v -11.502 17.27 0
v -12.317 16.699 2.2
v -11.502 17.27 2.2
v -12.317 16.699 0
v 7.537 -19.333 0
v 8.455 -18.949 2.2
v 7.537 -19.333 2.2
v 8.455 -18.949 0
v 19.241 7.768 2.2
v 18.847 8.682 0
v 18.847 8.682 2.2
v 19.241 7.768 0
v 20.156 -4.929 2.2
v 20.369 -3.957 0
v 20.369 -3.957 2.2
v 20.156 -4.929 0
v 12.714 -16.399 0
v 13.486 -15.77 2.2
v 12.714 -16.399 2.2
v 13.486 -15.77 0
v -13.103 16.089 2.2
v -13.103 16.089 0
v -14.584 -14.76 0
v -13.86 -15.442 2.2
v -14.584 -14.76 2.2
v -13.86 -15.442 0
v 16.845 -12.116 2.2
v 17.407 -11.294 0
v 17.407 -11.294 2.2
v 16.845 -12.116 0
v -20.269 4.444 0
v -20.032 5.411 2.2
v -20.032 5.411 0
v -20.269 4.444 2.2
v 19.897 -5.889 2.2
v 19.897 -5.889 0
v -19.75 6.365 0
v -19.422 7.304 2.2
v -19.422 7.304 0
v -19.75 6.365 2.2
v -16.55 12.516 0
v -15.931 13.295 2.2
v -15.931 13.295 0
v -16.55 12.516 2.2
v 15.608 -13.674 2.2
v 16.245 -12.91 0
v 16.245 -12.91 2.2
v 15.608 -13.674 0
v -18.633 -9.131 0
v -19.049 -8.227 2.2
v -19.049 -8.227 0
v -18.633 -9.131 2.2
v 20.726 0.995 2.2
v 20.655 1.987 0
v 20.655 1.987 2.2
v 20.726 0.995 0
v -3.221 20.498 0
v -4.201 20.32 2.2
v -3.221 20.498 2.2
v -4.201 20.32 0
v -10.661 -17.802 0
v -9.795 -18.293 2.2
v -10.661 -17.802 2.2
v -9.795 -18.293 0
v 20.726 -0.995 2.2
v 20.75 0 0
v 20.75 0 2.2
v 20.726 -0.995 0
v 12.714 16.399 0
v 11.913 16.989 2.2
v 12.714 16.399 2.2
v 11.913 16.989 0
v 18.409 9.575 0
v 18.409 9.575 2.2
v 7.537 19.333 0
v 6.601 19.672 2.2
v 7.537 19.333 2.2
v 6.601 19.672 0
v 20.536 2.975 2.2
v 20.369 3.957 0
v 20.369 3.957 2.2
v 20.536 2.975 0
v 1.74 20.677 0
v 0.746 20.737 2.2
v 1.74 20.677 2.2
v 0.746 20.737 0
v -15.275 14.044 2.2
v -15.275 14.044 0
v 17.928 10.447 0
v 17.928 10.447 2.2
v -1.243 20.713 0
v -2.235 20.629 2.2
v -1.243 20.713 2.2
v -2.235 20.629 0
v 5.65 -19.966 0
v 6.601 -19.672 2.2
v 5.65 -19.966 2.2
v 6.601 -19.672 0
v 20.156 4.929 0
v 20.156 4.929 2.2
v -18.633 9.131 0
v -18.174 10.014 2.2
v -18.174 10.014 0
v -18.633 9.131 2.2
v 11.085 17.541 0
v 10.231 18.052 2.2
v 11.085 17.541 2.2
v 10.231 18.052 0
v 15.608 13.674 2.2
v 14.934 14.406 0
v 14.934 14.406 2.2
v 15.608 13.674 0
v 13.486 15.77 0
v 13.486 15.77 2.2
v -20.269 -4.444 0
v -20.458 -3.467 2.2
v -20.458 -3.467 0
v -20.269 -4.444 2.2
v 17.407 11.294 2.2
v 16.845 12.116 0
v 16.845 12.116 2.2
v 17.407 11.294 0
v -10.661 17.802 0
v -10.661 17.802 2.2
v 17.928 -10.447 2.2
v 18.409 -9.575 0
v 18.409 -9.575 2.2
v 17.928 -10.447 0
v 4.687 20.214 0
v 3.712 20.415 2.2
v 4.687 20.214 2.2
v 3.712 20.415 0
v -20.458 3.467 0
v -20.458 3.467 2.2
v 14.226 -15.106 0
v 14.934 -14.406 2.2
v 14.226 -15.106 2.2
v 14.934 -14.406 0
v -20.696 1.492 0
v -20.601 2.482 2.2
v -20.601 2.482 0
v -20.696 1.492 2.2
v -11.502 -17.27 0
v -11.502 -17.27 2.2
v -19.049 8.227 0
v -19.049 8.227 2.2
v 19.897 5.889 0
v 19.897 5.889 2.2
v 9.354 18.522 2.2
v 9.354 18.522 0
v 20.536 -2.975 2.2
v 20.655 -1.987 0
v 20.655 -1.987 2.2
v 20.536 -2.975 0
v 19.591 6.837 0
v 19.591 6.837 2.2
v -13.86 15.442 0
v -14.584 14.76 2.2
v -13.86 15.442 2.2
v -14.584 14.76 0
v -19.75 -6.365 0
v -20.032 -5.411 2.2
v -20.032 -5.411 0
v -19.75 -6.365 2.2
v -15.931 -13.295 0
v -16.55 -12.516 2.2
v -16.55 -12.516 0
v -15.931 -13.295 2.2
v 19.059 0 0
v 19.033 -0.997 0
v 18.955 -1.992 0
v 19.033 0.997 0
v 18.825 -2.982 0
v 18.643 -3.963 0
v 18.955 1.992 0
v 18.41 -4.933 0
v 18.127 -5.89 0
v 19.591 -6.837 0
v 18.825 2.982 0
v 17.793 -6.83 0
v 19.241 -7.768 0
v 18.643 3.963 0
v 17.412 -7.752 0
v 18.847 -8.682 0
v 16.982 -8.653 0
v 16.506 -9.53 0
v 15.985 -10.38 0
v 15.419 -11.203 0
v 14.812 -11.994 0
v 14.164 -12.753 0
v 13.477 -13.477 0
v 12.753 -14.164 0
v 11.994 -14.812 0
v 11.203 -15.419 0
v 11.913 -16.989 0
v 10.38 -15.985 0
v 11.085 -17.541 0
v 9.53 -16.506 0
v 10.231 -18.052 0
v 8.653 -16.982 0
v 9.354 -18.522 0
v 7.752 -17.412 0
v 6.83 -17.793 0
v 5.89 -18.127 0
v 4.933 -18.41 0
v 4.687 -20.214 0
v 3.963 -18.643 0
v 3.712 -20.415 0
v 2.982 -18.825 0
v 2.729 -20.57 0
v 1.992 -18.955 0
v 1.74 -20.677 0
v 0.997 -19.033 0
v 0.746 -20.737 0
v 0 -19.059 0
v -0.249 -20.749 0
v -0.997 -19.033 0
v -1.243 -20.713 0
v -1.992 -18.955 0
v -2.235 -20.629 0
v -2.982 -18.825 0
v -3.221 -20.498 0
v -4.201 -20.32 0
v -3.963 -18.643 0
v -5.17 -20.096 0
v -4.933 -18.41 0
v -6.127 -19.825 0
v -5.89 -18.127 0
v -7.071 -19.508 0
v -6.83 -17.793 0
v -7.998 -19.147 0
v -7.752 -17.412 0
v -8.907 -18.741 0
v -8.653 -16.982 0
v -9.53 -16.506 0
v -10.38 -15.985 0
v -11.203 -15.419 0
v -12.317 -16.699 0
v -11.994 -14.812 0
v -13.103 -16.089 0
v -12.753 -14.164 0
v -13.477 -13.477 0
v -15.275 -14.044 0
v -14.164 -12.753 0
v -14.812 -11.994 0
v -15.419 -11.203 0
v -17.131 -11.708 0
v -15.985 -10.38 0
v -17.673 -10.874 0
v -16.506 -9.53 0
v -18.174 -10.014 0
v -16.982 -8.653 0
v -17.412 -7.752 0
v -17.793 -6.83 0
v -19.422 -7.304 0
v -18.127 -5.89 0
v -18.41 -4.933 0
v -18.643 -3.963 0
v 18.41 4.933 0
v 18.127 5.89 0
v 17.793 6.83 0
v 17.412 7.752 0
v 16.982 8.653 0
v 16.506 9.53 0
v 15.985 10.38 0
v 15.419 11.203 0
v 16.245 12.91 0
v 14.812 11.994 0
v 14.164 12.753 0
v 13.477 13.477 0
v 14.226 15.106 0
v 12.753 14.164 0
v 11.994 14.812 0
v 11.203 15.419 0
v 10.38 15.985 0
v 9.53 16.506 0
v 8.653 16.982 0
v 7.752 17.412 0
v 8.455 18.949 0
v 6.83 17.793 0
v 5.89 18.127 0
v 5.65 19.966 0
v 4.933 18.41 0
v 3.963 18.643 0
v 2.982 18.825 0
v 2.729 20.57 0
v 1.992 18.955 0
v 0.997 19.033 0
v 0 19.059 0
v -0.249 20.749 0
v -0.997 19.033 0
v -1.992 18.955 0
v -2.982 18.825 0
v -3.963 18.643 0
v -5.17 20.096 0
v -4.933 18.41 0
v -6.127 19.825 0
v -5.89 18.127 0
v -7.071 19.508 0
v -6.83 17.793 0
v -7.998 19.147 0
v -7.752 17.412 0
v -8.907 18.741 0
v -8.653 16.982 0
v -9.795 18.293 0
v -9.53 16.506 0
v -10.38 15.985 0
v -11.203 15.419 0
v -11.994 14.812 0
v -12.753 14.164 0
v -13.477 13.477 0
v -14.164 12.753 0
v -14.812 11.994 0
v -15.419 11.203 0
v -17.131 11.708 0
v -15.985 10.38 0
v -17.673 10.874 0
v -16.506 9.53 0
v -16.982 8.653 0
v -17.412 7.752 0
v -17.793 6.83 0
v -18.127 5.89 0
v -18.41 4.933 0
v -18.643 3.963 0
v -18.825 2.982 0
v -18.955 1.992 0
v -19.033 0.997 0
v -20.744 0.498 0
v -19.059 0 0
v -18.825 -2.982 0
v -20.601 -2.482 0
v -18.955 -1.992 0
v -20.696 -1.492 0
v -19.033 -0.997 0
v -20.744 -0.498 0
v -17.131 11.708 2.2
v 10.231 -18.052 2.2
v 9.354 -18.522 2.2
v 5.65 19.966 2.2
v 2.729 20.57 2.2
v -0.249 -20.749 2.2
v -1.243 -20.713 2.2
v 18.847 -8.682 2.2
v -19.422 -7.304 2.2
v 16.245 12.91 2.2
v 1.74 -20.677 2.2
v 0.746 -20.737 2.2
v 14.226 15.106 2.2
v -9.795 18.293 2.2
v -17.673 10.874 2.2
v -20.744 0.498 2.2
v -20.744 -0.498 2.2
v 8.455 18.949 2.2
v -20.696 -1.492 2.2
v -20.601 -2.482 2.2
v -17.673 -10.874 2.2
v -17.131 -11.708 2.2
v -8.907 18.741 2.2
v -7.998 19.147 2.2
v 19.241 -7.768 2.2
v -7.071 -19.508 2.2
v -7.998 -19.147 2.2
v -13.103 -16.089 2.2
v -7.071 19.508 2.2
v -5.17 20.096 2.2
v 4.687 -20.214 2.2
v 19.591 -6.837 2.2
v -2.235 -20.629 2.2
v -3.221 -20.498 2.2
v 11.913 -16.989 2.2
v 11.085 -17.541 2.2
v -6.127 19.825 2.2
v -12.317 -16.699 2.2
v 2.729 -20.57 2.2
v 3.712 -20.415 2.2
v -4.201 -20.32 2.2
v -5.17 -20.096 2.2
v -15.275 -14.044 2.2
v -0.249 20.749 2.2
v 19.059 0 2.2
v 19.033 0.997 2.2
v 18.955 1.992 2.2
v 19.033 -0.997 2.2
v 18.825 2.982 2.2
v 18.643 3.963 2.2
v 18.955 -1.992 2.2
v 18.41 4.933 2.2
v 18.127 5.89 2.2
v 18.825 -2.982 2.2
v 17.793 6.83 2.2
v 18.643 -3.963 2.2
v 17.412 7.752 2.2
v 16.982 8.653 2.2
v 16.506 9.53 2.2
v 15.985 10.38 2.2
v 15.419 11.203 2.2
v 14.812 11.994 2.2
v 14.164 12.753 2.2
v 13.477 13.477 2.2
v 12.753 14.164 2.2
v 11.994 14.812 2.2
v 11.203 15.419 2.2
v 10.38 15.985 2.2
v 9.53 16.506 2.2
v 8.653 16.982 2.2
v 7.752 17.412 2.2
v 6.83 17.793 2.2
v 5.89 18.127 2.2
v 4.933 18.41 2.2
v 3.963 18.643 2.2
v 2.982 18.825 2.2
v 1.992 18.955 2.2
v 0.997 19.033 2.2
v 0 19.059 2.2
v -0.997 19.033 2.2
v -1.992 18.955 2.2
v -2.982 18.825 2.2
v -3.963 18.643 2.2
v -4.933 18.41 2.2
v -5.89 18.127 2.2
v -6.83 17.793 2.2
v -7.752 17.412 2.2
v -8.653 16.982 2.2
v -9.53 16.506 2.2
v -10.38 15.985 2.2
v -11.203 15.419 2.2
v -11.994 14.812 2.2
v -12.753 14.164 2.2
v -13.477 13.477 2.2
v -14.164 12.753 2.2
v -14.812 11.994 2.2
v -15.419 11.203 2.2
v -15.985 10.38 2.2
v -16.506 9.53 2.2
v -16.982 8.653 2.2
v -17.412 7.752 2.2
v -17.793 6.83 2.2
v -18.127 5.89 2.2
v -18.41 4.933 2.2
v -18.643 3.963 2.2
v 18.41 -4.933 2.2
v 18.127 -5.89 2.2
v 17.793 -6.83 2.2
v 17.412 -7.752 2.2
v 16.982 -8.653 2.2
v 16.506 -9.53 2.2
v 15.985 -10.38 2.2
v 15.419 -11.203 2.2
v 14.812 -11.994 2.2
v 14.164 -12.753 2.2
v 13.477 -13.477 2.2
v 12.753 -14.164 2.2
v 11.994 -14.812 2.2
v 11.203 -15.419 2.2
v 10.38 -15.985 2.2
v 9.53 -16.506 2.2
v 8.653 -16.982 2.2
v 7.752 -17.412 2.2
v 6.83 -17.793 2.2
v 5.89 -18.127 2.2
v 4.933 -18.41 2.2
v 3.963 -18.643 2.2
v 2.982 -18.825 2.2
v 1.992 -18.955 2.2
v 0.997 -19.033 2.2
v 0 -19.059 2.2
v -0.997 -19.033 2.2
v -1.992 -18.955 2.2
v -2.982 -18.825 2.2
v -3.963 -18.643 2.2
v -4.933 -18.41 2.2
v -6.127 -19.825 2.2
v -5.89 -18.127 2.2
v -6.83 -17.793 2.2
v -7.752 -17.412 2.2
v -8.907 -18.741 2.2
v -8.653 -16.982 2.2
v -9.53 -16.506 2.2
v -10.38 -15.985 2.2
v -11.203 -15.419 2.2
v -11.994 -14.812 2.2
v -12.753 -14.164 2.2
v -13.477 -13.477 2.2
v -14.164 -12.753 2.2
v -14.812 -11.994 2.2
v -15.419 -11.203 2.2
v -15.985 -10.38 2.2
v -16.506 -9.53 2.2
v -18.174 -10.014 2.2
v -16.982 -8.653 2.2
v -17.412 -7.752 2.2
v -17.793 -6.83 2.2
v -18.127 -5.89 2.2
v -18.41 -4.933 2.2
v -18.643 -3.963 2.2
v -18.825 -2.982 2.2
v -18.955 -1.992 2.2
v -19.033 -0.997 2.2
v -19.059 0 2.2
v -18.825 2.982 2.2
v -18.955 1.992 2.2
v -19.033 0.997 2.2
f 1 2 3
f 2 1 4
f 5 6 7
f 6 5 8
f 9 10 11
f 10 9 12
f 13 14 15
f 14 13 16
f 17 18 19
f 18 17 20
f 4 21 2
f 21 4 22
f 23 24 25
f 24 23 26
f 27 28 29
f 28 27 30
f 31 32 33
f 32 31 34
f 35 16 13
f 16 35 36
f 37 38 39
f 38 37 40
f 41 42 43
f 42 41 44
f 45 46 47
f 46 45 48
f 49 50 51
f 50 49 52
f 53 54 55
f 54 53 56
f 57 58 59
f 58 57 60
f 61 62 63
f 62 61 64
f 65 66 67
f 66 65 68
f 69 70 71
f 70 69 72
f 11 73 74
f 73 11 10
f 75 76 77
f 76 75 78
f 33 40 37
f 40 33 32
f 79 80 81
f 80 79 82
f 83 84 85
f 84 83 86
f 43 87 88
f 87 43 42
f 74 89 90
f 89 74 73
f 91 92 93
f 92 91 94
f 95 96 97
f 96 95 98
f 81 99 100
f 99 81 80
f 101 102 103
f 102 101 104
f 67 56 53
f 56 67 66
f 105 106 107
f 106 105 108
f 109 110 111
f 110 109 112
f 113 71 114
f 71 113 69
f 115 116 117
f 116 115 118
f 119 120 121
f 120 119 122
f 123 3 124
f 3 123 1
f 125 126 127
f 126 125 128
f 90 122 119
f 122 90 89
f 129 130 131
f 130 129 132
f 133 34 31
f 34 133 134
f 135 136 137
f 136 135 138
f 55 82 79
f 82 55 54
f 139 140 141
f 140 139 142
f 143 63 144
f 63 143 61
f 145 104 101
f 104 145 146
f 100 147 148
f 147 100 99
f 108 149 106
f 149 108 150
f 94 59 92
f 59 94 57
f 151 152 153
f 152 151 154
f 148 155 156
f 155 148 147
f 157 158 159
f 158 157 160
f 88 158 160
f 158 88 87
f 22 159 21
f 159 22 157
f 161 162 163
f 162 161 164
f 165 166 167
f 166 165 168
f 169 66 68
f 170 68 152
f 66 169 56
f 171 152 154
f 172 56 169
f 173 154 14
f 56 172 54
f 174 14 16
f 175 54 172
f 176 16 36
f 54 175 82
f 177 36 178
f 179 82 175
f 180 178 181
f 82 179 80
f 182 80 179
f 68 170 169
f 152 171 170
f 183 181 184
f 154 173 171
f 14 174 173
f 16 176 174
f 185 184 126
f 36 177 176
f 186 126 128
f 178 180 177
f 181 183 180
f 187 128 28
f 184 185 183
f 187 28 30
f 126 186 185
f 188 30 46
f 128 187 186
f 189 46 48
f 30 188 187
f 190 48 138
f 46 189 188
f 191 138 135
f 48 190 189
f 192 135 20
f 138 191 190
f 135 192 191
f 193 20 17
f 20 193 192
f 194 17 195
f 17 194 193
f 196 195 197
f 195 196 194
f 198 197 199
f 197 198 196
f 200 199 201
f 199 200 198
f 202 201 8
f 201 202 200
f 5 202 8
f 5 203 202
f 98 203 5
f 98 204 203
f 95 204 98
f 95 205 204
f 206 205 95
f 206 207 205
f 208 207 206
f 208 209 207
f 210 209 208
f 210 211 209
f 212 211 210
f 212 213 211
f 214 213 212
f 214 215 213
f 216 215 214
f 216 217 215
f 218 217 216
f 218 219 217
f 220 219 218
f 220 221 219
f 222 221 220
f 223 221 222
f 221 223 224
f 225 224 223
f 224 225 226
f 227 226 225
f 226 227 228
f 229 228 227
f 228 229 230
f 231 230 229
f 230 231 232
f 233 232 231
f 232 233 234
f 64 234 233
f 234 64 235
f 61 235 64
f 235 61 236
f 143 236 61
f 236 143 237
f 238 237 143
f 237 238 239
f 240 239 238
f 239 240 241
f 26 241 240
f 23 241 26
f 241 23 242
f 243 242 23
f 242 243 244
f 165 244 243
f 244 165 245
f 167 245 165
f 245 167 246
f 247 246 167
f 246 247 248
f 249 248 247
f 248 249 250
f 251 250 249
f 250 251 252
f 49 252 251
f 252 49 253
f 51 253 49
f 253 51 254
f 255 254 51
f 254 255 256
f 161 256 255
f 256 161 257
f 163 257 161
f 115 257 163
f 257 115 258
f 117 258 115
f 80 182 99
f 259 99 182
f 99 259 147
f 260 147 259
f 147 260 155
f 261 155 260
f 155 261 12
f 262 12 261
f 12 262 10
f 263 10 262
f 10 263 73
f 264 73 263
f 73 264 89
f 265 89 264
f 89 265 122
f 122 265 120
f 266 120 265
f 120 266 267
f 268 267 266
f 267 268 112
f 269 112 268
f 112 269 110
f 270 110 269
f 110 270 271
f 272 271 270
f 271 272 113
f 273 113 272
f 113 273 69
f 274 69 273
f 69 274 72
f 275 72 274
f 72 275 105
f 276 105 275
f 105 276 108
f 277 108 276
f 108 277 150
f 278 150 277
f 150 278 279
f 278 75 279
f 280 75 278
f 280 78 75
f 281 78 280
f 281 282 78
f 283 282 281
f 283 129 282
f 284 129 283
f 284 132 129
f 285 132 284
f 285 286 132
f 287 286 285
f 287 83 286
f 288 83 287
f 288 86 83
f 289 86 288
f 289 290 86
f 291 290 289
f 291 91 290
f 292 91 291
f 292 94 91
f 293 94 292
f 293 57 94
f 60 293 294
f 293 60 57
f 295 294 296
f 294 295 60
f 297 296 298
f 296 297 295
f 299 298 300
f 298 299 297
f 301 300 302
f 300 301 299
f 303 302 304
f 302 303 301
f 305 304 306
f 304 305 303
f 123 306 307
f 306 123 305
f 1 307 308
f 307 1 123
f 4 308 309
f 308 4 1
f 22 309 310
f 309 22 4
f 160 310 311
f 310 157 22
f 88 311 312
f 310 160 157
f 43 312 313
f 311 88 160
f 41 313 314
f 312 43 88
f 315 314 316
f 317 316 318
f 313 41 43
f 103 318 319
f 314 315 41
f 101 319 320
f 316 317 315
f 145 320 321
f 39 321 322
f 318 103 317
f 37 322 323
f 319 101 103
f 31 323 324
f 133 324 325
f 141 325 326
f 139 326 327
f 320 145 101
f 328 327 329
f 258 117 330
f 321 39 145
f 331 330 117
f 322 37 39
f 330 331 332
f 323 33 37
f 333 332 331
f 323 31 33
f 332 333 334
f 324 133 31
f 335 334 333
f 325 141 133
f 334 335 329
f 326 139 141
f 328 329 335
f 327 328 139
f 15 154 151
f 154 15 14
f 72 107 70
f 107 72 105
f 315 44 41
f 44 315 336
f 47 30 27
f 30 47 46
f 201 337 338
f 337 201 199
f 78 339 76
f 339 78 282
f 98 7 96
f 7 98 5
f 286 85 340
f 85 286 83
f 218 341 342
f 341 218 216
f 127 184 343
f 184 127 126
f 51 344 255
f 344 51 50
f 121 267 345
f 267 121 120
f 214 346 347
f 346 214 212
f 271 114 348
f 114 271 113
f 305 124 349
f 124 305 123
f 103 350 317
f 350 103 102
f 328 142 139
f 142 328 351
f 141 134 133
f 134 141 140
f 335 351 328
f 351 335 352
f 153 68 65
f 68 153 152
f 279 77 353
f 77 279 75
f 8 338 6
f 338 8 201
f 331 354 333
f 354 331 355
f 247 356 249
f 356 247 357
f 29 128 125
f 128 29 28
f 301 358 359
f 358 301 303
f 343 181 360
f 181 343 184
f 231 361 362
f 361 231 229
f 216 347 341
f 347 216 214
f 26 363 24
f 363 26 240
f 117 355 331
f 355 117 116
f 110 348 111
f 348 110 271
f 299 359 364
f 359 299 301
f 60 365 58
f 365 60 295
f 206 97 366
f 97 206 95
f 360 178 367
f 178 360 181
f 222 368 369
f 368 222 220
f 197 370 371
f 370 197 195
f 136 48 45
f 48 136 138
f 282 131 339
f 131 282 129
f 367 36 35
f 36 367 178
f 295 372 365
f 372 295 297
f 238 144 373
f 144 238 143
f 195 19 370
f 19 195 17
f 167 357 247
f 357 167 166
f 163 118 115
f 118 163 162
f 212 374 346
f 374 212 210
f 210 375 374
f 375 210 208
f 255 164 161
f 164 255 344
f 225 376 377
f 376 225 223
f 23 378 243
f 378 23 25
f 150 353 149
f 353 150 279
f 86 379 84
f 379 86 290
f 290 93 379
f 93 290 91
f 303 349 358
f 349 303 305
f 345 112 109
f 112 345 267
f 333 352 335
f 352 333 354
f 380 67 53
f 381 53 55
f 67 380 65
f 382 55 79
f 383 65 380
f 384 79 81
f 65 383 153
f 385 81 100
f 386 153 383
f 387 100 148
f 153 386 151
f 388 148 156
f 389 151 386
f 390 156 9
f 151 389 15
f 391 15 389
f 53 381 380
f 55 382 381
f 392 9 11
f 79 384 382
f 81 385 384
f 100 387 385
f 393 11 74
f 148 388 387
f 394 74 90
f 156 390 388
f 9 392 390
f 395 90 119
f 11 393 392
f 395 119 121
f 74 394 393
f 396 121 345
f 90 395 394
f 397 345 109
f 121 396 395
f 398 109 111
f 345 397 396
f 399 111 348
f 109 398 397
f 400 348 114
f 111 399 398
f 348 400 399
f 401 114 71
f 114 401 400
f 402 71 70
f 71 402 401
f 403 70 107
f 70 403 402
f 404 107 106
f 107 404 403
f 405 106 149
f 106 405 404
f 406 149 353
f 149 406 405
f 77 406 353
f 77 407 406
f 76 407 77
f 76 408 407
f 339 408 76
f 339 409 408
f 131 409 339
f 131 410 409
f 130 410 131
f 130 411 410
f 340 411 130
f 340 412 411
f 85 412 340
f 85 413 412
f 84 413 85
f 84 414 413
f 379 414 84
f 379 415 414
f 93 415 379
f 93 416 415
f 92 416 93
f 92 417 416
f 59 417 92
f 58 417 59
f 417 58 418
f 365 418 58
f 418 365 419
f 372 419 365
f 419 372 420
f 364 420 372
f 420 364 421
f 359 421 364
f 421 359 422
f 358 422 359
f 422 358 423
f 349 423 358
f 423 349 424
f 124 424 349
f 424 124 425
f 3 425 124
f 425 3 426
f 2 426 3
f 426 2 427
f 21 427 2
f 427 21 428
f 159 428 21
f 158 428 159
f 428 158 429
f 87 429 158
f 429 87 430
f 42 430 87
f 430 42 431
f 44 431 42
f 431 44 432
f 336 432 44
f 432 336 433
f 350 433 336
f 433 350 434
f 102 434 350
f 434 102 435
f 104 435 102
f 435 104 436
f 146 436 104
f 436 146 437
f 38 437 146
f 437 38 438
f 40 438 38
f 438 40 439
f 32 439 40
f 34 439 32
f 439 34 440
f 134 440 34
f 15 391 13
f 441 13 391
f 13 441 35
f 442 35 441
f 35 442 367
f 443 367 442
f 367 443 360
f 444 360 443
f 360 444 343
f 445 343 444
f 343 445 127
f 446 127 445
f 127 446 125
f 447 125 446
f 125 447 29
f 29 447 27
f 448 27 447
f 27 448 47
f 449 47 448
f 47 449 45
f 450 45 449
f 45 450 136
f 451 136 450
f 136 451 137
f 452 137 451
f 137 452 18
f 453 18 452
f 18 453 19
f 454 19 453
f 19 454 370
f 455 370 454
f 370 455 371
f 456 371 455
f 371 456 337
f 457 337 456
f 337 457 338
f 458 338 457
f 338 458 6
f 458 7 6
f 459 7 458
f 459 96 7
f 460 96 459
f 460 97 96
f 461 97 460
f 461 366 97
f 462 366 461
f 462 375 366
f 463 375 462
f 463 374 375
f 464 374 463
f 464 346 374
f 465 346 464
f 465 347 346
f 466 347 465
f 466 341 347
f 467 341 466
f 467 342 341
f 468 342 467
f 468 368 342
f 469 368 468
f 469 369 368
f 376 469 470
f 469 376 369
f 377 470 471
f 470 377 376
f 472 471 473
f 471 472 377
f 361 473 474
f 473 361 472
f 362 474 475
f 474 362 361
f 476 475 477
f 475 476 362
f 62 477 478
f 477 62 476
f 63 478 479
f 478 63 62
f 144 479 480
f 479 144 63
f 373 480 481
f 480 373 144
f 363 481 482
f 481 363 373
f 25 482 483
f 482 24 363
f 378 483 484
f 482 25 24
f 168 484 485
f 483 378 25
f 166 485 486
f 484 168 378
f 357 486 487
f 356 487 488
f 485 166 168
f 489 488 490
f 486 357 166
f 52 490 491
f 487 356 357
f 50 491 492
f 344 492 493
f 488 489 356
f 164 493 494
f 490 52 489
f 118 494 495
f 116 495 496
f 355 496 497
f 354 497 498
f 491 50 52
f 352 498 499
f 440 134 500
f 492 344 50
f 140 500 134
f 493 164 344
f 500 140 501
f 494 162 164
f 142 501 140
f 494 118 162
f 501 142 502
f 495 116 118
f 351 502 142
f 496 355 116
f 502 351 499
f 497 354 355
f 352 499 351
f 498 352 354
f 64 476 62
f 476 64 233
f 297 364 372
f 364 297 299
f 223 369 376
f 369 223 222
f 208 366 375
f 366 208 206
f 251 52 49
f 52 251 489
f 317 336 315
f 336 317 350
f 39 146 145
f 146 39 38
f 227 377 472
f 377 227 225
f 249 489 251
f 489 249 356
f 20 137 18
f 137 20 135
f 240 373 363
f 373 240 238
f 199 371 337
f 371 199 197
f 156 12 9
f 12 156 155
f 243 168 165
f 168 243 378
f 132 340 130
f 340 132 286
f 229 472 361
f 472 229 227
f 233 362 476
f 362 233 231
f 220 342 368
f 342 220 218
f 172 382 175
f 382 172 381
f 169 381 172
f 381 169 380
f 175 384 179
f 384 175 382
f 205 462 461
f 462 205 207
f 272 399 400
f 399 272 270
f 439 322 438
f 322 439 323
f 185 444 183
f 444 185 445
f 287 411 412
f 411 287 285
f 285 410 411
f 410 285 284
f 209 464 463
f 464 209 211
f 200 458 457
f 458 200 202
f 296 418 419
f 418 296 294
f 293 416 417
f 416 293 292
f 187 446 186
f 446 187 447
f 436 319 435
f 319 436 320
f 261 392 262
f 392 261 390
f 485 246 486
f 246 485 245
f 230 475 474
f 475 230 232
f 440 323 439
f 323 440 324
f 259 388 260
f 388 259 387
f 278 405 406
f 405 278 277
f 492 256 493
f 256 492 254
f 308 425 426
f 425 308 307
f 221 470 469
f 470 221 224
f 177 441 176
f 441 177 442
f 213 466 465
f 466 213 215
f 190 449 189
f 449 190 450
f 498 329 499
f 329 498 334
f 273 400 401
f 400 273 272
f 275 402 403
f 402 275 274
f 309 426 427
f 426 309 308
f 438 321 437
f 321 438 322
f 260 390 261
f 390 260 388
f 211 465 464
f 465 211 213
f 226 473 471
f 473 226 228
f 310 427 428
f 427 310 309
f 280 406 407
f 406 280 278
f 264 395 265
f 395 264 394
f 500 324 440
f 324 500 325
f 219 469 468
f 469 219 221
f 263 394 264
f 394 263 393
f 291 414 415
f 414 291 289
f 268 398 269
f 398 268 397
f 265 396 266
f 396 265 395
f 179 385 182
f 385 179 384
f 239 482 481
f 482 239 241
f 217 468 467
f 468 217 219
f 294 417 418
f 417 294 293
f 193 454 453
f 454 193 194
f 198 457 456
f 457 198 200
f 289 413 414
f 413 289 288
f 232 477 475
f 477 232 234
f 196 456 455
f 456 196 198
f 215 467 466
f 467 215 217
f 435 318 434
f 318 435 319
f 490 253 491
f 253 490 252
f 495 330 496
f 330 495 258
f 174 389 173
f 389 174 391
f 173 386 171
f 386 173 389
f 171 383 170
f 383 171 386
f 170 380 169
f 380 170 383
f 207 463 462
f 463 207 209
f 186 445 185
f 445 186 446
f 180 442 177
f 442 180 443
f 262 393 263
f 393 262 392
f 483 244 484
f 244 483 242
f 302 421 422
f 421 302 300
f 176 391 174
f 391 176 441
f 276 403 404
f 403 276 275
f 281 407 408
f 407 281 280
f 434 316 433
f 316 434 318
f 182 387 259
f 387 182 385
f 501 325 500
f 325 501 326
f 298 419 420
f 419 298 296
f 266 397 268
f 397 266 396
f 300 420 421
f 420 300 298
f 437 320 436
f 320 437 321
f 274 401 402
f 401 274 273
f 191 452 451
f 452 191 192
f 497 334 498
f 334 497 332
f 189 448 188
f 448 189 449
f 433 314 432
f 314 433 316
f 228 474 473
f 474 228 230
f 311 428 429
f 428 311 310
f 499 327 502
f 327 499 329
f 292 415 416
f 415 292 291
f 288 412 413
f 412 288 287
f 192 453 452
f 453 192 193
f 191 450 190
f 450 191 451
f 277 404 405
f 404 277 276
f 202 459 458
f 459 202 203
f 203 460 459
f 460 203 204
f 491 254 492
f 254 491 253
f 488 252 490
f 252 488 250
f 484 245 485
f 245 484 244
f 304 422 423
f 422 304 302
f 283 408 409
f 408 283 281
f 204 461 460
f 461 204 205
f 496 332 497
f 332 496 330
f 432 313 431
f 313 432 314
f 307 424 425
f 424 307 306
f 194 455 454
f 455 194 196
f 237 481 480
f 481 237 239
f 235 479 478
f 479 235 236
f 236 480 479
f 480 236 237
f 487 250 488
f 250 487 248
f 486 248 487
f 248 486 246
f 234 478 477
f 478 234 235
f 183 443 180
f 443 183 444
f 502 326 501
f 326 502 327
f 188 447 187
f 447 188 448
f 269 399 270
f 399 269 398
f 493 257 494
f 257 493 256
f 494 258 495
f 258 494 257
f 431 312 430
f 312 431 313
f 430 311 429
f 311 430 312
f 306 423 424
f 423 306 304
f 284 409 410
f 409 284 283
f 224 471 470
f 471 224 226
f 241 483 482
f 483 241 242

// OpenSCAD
// Lithophane inset for Sonogram picture frame 
// by György Balássy 2018 (http://gyorgybalassy.wordpress.com)
// https://www.thingiverse.com/thing:2794787

// Original model: keychain-Customizable Lithopane by Mark G. Peeters 
// http://www.thingiverse.com/thing:308109
// version 1.3 

// Use this tool to convert your image files to DAT:
// http://customizer.makerbot.com/image_surface

// preview[view:south, tilt:top]
//
//
/* [Image] */

// Load a 100x100 pixel image.(images will be stretched to fit) Simple photos work best. Don't forget to click the Invert Colors checkbox! *** ALSO IF YOU HAVE LETTERS IN YOUR IMAGE make sure to reverse the image before uploading so the letters are not backwards.
image_file = "my_image.dat"; // [image_surface:100x100]

/* [Adjustments] */

// What layer height will you slice this at? The thinner the better.
layer_height = 0.1;

// Use plastic color opacity to set this. The lower the layer height, the more layers you can use.
number_of_layers = 16; // [5:30]

/* [Hidden] */

border_width = 1.5;
border_thick = 2.2;
tag_size = 41.5 - 2 * border_width;

// Base will always be 2 layers thick.
min_layer_height = layer_height*2;
height = layer_height*number_of_layers;
maxheight = height+min_layer_height;

$fa = 1;   // Default minimum facet angle.
$fs = 1;   // Default minimum facet size.

// Make litho and trim bottom and sides
difference() {
  translate([0, 0, min_layer_height]) 
    scale([(tag_size/100),(tag_size/100),height]) 
      surface(file=image_file, center=true, convexity=5); //litosurface moved up min_layer_height
  translate([0,0,-(maxheight)]) 
    linear_extrude(height=maxheight) 
      square(tag_size, center=true); //cutting bottom off surface

  // make tube to trim lith.
  difference() {
    translate([0, 0, -7]) 
      cylinder(maxheight+15,r= tag_size);     // Outside
    translate([0, 0, -9]) 
      cylinder(maxheight+18,r= (tag_size/2)); // Inside
  }
}

// Add border.
difference() {
  cylinder(border_thick,r= (tag_size/2)+border_width); // Outside
  cylinder(border_thick+1,r= (tag_size/2.02));         // Inside
}
